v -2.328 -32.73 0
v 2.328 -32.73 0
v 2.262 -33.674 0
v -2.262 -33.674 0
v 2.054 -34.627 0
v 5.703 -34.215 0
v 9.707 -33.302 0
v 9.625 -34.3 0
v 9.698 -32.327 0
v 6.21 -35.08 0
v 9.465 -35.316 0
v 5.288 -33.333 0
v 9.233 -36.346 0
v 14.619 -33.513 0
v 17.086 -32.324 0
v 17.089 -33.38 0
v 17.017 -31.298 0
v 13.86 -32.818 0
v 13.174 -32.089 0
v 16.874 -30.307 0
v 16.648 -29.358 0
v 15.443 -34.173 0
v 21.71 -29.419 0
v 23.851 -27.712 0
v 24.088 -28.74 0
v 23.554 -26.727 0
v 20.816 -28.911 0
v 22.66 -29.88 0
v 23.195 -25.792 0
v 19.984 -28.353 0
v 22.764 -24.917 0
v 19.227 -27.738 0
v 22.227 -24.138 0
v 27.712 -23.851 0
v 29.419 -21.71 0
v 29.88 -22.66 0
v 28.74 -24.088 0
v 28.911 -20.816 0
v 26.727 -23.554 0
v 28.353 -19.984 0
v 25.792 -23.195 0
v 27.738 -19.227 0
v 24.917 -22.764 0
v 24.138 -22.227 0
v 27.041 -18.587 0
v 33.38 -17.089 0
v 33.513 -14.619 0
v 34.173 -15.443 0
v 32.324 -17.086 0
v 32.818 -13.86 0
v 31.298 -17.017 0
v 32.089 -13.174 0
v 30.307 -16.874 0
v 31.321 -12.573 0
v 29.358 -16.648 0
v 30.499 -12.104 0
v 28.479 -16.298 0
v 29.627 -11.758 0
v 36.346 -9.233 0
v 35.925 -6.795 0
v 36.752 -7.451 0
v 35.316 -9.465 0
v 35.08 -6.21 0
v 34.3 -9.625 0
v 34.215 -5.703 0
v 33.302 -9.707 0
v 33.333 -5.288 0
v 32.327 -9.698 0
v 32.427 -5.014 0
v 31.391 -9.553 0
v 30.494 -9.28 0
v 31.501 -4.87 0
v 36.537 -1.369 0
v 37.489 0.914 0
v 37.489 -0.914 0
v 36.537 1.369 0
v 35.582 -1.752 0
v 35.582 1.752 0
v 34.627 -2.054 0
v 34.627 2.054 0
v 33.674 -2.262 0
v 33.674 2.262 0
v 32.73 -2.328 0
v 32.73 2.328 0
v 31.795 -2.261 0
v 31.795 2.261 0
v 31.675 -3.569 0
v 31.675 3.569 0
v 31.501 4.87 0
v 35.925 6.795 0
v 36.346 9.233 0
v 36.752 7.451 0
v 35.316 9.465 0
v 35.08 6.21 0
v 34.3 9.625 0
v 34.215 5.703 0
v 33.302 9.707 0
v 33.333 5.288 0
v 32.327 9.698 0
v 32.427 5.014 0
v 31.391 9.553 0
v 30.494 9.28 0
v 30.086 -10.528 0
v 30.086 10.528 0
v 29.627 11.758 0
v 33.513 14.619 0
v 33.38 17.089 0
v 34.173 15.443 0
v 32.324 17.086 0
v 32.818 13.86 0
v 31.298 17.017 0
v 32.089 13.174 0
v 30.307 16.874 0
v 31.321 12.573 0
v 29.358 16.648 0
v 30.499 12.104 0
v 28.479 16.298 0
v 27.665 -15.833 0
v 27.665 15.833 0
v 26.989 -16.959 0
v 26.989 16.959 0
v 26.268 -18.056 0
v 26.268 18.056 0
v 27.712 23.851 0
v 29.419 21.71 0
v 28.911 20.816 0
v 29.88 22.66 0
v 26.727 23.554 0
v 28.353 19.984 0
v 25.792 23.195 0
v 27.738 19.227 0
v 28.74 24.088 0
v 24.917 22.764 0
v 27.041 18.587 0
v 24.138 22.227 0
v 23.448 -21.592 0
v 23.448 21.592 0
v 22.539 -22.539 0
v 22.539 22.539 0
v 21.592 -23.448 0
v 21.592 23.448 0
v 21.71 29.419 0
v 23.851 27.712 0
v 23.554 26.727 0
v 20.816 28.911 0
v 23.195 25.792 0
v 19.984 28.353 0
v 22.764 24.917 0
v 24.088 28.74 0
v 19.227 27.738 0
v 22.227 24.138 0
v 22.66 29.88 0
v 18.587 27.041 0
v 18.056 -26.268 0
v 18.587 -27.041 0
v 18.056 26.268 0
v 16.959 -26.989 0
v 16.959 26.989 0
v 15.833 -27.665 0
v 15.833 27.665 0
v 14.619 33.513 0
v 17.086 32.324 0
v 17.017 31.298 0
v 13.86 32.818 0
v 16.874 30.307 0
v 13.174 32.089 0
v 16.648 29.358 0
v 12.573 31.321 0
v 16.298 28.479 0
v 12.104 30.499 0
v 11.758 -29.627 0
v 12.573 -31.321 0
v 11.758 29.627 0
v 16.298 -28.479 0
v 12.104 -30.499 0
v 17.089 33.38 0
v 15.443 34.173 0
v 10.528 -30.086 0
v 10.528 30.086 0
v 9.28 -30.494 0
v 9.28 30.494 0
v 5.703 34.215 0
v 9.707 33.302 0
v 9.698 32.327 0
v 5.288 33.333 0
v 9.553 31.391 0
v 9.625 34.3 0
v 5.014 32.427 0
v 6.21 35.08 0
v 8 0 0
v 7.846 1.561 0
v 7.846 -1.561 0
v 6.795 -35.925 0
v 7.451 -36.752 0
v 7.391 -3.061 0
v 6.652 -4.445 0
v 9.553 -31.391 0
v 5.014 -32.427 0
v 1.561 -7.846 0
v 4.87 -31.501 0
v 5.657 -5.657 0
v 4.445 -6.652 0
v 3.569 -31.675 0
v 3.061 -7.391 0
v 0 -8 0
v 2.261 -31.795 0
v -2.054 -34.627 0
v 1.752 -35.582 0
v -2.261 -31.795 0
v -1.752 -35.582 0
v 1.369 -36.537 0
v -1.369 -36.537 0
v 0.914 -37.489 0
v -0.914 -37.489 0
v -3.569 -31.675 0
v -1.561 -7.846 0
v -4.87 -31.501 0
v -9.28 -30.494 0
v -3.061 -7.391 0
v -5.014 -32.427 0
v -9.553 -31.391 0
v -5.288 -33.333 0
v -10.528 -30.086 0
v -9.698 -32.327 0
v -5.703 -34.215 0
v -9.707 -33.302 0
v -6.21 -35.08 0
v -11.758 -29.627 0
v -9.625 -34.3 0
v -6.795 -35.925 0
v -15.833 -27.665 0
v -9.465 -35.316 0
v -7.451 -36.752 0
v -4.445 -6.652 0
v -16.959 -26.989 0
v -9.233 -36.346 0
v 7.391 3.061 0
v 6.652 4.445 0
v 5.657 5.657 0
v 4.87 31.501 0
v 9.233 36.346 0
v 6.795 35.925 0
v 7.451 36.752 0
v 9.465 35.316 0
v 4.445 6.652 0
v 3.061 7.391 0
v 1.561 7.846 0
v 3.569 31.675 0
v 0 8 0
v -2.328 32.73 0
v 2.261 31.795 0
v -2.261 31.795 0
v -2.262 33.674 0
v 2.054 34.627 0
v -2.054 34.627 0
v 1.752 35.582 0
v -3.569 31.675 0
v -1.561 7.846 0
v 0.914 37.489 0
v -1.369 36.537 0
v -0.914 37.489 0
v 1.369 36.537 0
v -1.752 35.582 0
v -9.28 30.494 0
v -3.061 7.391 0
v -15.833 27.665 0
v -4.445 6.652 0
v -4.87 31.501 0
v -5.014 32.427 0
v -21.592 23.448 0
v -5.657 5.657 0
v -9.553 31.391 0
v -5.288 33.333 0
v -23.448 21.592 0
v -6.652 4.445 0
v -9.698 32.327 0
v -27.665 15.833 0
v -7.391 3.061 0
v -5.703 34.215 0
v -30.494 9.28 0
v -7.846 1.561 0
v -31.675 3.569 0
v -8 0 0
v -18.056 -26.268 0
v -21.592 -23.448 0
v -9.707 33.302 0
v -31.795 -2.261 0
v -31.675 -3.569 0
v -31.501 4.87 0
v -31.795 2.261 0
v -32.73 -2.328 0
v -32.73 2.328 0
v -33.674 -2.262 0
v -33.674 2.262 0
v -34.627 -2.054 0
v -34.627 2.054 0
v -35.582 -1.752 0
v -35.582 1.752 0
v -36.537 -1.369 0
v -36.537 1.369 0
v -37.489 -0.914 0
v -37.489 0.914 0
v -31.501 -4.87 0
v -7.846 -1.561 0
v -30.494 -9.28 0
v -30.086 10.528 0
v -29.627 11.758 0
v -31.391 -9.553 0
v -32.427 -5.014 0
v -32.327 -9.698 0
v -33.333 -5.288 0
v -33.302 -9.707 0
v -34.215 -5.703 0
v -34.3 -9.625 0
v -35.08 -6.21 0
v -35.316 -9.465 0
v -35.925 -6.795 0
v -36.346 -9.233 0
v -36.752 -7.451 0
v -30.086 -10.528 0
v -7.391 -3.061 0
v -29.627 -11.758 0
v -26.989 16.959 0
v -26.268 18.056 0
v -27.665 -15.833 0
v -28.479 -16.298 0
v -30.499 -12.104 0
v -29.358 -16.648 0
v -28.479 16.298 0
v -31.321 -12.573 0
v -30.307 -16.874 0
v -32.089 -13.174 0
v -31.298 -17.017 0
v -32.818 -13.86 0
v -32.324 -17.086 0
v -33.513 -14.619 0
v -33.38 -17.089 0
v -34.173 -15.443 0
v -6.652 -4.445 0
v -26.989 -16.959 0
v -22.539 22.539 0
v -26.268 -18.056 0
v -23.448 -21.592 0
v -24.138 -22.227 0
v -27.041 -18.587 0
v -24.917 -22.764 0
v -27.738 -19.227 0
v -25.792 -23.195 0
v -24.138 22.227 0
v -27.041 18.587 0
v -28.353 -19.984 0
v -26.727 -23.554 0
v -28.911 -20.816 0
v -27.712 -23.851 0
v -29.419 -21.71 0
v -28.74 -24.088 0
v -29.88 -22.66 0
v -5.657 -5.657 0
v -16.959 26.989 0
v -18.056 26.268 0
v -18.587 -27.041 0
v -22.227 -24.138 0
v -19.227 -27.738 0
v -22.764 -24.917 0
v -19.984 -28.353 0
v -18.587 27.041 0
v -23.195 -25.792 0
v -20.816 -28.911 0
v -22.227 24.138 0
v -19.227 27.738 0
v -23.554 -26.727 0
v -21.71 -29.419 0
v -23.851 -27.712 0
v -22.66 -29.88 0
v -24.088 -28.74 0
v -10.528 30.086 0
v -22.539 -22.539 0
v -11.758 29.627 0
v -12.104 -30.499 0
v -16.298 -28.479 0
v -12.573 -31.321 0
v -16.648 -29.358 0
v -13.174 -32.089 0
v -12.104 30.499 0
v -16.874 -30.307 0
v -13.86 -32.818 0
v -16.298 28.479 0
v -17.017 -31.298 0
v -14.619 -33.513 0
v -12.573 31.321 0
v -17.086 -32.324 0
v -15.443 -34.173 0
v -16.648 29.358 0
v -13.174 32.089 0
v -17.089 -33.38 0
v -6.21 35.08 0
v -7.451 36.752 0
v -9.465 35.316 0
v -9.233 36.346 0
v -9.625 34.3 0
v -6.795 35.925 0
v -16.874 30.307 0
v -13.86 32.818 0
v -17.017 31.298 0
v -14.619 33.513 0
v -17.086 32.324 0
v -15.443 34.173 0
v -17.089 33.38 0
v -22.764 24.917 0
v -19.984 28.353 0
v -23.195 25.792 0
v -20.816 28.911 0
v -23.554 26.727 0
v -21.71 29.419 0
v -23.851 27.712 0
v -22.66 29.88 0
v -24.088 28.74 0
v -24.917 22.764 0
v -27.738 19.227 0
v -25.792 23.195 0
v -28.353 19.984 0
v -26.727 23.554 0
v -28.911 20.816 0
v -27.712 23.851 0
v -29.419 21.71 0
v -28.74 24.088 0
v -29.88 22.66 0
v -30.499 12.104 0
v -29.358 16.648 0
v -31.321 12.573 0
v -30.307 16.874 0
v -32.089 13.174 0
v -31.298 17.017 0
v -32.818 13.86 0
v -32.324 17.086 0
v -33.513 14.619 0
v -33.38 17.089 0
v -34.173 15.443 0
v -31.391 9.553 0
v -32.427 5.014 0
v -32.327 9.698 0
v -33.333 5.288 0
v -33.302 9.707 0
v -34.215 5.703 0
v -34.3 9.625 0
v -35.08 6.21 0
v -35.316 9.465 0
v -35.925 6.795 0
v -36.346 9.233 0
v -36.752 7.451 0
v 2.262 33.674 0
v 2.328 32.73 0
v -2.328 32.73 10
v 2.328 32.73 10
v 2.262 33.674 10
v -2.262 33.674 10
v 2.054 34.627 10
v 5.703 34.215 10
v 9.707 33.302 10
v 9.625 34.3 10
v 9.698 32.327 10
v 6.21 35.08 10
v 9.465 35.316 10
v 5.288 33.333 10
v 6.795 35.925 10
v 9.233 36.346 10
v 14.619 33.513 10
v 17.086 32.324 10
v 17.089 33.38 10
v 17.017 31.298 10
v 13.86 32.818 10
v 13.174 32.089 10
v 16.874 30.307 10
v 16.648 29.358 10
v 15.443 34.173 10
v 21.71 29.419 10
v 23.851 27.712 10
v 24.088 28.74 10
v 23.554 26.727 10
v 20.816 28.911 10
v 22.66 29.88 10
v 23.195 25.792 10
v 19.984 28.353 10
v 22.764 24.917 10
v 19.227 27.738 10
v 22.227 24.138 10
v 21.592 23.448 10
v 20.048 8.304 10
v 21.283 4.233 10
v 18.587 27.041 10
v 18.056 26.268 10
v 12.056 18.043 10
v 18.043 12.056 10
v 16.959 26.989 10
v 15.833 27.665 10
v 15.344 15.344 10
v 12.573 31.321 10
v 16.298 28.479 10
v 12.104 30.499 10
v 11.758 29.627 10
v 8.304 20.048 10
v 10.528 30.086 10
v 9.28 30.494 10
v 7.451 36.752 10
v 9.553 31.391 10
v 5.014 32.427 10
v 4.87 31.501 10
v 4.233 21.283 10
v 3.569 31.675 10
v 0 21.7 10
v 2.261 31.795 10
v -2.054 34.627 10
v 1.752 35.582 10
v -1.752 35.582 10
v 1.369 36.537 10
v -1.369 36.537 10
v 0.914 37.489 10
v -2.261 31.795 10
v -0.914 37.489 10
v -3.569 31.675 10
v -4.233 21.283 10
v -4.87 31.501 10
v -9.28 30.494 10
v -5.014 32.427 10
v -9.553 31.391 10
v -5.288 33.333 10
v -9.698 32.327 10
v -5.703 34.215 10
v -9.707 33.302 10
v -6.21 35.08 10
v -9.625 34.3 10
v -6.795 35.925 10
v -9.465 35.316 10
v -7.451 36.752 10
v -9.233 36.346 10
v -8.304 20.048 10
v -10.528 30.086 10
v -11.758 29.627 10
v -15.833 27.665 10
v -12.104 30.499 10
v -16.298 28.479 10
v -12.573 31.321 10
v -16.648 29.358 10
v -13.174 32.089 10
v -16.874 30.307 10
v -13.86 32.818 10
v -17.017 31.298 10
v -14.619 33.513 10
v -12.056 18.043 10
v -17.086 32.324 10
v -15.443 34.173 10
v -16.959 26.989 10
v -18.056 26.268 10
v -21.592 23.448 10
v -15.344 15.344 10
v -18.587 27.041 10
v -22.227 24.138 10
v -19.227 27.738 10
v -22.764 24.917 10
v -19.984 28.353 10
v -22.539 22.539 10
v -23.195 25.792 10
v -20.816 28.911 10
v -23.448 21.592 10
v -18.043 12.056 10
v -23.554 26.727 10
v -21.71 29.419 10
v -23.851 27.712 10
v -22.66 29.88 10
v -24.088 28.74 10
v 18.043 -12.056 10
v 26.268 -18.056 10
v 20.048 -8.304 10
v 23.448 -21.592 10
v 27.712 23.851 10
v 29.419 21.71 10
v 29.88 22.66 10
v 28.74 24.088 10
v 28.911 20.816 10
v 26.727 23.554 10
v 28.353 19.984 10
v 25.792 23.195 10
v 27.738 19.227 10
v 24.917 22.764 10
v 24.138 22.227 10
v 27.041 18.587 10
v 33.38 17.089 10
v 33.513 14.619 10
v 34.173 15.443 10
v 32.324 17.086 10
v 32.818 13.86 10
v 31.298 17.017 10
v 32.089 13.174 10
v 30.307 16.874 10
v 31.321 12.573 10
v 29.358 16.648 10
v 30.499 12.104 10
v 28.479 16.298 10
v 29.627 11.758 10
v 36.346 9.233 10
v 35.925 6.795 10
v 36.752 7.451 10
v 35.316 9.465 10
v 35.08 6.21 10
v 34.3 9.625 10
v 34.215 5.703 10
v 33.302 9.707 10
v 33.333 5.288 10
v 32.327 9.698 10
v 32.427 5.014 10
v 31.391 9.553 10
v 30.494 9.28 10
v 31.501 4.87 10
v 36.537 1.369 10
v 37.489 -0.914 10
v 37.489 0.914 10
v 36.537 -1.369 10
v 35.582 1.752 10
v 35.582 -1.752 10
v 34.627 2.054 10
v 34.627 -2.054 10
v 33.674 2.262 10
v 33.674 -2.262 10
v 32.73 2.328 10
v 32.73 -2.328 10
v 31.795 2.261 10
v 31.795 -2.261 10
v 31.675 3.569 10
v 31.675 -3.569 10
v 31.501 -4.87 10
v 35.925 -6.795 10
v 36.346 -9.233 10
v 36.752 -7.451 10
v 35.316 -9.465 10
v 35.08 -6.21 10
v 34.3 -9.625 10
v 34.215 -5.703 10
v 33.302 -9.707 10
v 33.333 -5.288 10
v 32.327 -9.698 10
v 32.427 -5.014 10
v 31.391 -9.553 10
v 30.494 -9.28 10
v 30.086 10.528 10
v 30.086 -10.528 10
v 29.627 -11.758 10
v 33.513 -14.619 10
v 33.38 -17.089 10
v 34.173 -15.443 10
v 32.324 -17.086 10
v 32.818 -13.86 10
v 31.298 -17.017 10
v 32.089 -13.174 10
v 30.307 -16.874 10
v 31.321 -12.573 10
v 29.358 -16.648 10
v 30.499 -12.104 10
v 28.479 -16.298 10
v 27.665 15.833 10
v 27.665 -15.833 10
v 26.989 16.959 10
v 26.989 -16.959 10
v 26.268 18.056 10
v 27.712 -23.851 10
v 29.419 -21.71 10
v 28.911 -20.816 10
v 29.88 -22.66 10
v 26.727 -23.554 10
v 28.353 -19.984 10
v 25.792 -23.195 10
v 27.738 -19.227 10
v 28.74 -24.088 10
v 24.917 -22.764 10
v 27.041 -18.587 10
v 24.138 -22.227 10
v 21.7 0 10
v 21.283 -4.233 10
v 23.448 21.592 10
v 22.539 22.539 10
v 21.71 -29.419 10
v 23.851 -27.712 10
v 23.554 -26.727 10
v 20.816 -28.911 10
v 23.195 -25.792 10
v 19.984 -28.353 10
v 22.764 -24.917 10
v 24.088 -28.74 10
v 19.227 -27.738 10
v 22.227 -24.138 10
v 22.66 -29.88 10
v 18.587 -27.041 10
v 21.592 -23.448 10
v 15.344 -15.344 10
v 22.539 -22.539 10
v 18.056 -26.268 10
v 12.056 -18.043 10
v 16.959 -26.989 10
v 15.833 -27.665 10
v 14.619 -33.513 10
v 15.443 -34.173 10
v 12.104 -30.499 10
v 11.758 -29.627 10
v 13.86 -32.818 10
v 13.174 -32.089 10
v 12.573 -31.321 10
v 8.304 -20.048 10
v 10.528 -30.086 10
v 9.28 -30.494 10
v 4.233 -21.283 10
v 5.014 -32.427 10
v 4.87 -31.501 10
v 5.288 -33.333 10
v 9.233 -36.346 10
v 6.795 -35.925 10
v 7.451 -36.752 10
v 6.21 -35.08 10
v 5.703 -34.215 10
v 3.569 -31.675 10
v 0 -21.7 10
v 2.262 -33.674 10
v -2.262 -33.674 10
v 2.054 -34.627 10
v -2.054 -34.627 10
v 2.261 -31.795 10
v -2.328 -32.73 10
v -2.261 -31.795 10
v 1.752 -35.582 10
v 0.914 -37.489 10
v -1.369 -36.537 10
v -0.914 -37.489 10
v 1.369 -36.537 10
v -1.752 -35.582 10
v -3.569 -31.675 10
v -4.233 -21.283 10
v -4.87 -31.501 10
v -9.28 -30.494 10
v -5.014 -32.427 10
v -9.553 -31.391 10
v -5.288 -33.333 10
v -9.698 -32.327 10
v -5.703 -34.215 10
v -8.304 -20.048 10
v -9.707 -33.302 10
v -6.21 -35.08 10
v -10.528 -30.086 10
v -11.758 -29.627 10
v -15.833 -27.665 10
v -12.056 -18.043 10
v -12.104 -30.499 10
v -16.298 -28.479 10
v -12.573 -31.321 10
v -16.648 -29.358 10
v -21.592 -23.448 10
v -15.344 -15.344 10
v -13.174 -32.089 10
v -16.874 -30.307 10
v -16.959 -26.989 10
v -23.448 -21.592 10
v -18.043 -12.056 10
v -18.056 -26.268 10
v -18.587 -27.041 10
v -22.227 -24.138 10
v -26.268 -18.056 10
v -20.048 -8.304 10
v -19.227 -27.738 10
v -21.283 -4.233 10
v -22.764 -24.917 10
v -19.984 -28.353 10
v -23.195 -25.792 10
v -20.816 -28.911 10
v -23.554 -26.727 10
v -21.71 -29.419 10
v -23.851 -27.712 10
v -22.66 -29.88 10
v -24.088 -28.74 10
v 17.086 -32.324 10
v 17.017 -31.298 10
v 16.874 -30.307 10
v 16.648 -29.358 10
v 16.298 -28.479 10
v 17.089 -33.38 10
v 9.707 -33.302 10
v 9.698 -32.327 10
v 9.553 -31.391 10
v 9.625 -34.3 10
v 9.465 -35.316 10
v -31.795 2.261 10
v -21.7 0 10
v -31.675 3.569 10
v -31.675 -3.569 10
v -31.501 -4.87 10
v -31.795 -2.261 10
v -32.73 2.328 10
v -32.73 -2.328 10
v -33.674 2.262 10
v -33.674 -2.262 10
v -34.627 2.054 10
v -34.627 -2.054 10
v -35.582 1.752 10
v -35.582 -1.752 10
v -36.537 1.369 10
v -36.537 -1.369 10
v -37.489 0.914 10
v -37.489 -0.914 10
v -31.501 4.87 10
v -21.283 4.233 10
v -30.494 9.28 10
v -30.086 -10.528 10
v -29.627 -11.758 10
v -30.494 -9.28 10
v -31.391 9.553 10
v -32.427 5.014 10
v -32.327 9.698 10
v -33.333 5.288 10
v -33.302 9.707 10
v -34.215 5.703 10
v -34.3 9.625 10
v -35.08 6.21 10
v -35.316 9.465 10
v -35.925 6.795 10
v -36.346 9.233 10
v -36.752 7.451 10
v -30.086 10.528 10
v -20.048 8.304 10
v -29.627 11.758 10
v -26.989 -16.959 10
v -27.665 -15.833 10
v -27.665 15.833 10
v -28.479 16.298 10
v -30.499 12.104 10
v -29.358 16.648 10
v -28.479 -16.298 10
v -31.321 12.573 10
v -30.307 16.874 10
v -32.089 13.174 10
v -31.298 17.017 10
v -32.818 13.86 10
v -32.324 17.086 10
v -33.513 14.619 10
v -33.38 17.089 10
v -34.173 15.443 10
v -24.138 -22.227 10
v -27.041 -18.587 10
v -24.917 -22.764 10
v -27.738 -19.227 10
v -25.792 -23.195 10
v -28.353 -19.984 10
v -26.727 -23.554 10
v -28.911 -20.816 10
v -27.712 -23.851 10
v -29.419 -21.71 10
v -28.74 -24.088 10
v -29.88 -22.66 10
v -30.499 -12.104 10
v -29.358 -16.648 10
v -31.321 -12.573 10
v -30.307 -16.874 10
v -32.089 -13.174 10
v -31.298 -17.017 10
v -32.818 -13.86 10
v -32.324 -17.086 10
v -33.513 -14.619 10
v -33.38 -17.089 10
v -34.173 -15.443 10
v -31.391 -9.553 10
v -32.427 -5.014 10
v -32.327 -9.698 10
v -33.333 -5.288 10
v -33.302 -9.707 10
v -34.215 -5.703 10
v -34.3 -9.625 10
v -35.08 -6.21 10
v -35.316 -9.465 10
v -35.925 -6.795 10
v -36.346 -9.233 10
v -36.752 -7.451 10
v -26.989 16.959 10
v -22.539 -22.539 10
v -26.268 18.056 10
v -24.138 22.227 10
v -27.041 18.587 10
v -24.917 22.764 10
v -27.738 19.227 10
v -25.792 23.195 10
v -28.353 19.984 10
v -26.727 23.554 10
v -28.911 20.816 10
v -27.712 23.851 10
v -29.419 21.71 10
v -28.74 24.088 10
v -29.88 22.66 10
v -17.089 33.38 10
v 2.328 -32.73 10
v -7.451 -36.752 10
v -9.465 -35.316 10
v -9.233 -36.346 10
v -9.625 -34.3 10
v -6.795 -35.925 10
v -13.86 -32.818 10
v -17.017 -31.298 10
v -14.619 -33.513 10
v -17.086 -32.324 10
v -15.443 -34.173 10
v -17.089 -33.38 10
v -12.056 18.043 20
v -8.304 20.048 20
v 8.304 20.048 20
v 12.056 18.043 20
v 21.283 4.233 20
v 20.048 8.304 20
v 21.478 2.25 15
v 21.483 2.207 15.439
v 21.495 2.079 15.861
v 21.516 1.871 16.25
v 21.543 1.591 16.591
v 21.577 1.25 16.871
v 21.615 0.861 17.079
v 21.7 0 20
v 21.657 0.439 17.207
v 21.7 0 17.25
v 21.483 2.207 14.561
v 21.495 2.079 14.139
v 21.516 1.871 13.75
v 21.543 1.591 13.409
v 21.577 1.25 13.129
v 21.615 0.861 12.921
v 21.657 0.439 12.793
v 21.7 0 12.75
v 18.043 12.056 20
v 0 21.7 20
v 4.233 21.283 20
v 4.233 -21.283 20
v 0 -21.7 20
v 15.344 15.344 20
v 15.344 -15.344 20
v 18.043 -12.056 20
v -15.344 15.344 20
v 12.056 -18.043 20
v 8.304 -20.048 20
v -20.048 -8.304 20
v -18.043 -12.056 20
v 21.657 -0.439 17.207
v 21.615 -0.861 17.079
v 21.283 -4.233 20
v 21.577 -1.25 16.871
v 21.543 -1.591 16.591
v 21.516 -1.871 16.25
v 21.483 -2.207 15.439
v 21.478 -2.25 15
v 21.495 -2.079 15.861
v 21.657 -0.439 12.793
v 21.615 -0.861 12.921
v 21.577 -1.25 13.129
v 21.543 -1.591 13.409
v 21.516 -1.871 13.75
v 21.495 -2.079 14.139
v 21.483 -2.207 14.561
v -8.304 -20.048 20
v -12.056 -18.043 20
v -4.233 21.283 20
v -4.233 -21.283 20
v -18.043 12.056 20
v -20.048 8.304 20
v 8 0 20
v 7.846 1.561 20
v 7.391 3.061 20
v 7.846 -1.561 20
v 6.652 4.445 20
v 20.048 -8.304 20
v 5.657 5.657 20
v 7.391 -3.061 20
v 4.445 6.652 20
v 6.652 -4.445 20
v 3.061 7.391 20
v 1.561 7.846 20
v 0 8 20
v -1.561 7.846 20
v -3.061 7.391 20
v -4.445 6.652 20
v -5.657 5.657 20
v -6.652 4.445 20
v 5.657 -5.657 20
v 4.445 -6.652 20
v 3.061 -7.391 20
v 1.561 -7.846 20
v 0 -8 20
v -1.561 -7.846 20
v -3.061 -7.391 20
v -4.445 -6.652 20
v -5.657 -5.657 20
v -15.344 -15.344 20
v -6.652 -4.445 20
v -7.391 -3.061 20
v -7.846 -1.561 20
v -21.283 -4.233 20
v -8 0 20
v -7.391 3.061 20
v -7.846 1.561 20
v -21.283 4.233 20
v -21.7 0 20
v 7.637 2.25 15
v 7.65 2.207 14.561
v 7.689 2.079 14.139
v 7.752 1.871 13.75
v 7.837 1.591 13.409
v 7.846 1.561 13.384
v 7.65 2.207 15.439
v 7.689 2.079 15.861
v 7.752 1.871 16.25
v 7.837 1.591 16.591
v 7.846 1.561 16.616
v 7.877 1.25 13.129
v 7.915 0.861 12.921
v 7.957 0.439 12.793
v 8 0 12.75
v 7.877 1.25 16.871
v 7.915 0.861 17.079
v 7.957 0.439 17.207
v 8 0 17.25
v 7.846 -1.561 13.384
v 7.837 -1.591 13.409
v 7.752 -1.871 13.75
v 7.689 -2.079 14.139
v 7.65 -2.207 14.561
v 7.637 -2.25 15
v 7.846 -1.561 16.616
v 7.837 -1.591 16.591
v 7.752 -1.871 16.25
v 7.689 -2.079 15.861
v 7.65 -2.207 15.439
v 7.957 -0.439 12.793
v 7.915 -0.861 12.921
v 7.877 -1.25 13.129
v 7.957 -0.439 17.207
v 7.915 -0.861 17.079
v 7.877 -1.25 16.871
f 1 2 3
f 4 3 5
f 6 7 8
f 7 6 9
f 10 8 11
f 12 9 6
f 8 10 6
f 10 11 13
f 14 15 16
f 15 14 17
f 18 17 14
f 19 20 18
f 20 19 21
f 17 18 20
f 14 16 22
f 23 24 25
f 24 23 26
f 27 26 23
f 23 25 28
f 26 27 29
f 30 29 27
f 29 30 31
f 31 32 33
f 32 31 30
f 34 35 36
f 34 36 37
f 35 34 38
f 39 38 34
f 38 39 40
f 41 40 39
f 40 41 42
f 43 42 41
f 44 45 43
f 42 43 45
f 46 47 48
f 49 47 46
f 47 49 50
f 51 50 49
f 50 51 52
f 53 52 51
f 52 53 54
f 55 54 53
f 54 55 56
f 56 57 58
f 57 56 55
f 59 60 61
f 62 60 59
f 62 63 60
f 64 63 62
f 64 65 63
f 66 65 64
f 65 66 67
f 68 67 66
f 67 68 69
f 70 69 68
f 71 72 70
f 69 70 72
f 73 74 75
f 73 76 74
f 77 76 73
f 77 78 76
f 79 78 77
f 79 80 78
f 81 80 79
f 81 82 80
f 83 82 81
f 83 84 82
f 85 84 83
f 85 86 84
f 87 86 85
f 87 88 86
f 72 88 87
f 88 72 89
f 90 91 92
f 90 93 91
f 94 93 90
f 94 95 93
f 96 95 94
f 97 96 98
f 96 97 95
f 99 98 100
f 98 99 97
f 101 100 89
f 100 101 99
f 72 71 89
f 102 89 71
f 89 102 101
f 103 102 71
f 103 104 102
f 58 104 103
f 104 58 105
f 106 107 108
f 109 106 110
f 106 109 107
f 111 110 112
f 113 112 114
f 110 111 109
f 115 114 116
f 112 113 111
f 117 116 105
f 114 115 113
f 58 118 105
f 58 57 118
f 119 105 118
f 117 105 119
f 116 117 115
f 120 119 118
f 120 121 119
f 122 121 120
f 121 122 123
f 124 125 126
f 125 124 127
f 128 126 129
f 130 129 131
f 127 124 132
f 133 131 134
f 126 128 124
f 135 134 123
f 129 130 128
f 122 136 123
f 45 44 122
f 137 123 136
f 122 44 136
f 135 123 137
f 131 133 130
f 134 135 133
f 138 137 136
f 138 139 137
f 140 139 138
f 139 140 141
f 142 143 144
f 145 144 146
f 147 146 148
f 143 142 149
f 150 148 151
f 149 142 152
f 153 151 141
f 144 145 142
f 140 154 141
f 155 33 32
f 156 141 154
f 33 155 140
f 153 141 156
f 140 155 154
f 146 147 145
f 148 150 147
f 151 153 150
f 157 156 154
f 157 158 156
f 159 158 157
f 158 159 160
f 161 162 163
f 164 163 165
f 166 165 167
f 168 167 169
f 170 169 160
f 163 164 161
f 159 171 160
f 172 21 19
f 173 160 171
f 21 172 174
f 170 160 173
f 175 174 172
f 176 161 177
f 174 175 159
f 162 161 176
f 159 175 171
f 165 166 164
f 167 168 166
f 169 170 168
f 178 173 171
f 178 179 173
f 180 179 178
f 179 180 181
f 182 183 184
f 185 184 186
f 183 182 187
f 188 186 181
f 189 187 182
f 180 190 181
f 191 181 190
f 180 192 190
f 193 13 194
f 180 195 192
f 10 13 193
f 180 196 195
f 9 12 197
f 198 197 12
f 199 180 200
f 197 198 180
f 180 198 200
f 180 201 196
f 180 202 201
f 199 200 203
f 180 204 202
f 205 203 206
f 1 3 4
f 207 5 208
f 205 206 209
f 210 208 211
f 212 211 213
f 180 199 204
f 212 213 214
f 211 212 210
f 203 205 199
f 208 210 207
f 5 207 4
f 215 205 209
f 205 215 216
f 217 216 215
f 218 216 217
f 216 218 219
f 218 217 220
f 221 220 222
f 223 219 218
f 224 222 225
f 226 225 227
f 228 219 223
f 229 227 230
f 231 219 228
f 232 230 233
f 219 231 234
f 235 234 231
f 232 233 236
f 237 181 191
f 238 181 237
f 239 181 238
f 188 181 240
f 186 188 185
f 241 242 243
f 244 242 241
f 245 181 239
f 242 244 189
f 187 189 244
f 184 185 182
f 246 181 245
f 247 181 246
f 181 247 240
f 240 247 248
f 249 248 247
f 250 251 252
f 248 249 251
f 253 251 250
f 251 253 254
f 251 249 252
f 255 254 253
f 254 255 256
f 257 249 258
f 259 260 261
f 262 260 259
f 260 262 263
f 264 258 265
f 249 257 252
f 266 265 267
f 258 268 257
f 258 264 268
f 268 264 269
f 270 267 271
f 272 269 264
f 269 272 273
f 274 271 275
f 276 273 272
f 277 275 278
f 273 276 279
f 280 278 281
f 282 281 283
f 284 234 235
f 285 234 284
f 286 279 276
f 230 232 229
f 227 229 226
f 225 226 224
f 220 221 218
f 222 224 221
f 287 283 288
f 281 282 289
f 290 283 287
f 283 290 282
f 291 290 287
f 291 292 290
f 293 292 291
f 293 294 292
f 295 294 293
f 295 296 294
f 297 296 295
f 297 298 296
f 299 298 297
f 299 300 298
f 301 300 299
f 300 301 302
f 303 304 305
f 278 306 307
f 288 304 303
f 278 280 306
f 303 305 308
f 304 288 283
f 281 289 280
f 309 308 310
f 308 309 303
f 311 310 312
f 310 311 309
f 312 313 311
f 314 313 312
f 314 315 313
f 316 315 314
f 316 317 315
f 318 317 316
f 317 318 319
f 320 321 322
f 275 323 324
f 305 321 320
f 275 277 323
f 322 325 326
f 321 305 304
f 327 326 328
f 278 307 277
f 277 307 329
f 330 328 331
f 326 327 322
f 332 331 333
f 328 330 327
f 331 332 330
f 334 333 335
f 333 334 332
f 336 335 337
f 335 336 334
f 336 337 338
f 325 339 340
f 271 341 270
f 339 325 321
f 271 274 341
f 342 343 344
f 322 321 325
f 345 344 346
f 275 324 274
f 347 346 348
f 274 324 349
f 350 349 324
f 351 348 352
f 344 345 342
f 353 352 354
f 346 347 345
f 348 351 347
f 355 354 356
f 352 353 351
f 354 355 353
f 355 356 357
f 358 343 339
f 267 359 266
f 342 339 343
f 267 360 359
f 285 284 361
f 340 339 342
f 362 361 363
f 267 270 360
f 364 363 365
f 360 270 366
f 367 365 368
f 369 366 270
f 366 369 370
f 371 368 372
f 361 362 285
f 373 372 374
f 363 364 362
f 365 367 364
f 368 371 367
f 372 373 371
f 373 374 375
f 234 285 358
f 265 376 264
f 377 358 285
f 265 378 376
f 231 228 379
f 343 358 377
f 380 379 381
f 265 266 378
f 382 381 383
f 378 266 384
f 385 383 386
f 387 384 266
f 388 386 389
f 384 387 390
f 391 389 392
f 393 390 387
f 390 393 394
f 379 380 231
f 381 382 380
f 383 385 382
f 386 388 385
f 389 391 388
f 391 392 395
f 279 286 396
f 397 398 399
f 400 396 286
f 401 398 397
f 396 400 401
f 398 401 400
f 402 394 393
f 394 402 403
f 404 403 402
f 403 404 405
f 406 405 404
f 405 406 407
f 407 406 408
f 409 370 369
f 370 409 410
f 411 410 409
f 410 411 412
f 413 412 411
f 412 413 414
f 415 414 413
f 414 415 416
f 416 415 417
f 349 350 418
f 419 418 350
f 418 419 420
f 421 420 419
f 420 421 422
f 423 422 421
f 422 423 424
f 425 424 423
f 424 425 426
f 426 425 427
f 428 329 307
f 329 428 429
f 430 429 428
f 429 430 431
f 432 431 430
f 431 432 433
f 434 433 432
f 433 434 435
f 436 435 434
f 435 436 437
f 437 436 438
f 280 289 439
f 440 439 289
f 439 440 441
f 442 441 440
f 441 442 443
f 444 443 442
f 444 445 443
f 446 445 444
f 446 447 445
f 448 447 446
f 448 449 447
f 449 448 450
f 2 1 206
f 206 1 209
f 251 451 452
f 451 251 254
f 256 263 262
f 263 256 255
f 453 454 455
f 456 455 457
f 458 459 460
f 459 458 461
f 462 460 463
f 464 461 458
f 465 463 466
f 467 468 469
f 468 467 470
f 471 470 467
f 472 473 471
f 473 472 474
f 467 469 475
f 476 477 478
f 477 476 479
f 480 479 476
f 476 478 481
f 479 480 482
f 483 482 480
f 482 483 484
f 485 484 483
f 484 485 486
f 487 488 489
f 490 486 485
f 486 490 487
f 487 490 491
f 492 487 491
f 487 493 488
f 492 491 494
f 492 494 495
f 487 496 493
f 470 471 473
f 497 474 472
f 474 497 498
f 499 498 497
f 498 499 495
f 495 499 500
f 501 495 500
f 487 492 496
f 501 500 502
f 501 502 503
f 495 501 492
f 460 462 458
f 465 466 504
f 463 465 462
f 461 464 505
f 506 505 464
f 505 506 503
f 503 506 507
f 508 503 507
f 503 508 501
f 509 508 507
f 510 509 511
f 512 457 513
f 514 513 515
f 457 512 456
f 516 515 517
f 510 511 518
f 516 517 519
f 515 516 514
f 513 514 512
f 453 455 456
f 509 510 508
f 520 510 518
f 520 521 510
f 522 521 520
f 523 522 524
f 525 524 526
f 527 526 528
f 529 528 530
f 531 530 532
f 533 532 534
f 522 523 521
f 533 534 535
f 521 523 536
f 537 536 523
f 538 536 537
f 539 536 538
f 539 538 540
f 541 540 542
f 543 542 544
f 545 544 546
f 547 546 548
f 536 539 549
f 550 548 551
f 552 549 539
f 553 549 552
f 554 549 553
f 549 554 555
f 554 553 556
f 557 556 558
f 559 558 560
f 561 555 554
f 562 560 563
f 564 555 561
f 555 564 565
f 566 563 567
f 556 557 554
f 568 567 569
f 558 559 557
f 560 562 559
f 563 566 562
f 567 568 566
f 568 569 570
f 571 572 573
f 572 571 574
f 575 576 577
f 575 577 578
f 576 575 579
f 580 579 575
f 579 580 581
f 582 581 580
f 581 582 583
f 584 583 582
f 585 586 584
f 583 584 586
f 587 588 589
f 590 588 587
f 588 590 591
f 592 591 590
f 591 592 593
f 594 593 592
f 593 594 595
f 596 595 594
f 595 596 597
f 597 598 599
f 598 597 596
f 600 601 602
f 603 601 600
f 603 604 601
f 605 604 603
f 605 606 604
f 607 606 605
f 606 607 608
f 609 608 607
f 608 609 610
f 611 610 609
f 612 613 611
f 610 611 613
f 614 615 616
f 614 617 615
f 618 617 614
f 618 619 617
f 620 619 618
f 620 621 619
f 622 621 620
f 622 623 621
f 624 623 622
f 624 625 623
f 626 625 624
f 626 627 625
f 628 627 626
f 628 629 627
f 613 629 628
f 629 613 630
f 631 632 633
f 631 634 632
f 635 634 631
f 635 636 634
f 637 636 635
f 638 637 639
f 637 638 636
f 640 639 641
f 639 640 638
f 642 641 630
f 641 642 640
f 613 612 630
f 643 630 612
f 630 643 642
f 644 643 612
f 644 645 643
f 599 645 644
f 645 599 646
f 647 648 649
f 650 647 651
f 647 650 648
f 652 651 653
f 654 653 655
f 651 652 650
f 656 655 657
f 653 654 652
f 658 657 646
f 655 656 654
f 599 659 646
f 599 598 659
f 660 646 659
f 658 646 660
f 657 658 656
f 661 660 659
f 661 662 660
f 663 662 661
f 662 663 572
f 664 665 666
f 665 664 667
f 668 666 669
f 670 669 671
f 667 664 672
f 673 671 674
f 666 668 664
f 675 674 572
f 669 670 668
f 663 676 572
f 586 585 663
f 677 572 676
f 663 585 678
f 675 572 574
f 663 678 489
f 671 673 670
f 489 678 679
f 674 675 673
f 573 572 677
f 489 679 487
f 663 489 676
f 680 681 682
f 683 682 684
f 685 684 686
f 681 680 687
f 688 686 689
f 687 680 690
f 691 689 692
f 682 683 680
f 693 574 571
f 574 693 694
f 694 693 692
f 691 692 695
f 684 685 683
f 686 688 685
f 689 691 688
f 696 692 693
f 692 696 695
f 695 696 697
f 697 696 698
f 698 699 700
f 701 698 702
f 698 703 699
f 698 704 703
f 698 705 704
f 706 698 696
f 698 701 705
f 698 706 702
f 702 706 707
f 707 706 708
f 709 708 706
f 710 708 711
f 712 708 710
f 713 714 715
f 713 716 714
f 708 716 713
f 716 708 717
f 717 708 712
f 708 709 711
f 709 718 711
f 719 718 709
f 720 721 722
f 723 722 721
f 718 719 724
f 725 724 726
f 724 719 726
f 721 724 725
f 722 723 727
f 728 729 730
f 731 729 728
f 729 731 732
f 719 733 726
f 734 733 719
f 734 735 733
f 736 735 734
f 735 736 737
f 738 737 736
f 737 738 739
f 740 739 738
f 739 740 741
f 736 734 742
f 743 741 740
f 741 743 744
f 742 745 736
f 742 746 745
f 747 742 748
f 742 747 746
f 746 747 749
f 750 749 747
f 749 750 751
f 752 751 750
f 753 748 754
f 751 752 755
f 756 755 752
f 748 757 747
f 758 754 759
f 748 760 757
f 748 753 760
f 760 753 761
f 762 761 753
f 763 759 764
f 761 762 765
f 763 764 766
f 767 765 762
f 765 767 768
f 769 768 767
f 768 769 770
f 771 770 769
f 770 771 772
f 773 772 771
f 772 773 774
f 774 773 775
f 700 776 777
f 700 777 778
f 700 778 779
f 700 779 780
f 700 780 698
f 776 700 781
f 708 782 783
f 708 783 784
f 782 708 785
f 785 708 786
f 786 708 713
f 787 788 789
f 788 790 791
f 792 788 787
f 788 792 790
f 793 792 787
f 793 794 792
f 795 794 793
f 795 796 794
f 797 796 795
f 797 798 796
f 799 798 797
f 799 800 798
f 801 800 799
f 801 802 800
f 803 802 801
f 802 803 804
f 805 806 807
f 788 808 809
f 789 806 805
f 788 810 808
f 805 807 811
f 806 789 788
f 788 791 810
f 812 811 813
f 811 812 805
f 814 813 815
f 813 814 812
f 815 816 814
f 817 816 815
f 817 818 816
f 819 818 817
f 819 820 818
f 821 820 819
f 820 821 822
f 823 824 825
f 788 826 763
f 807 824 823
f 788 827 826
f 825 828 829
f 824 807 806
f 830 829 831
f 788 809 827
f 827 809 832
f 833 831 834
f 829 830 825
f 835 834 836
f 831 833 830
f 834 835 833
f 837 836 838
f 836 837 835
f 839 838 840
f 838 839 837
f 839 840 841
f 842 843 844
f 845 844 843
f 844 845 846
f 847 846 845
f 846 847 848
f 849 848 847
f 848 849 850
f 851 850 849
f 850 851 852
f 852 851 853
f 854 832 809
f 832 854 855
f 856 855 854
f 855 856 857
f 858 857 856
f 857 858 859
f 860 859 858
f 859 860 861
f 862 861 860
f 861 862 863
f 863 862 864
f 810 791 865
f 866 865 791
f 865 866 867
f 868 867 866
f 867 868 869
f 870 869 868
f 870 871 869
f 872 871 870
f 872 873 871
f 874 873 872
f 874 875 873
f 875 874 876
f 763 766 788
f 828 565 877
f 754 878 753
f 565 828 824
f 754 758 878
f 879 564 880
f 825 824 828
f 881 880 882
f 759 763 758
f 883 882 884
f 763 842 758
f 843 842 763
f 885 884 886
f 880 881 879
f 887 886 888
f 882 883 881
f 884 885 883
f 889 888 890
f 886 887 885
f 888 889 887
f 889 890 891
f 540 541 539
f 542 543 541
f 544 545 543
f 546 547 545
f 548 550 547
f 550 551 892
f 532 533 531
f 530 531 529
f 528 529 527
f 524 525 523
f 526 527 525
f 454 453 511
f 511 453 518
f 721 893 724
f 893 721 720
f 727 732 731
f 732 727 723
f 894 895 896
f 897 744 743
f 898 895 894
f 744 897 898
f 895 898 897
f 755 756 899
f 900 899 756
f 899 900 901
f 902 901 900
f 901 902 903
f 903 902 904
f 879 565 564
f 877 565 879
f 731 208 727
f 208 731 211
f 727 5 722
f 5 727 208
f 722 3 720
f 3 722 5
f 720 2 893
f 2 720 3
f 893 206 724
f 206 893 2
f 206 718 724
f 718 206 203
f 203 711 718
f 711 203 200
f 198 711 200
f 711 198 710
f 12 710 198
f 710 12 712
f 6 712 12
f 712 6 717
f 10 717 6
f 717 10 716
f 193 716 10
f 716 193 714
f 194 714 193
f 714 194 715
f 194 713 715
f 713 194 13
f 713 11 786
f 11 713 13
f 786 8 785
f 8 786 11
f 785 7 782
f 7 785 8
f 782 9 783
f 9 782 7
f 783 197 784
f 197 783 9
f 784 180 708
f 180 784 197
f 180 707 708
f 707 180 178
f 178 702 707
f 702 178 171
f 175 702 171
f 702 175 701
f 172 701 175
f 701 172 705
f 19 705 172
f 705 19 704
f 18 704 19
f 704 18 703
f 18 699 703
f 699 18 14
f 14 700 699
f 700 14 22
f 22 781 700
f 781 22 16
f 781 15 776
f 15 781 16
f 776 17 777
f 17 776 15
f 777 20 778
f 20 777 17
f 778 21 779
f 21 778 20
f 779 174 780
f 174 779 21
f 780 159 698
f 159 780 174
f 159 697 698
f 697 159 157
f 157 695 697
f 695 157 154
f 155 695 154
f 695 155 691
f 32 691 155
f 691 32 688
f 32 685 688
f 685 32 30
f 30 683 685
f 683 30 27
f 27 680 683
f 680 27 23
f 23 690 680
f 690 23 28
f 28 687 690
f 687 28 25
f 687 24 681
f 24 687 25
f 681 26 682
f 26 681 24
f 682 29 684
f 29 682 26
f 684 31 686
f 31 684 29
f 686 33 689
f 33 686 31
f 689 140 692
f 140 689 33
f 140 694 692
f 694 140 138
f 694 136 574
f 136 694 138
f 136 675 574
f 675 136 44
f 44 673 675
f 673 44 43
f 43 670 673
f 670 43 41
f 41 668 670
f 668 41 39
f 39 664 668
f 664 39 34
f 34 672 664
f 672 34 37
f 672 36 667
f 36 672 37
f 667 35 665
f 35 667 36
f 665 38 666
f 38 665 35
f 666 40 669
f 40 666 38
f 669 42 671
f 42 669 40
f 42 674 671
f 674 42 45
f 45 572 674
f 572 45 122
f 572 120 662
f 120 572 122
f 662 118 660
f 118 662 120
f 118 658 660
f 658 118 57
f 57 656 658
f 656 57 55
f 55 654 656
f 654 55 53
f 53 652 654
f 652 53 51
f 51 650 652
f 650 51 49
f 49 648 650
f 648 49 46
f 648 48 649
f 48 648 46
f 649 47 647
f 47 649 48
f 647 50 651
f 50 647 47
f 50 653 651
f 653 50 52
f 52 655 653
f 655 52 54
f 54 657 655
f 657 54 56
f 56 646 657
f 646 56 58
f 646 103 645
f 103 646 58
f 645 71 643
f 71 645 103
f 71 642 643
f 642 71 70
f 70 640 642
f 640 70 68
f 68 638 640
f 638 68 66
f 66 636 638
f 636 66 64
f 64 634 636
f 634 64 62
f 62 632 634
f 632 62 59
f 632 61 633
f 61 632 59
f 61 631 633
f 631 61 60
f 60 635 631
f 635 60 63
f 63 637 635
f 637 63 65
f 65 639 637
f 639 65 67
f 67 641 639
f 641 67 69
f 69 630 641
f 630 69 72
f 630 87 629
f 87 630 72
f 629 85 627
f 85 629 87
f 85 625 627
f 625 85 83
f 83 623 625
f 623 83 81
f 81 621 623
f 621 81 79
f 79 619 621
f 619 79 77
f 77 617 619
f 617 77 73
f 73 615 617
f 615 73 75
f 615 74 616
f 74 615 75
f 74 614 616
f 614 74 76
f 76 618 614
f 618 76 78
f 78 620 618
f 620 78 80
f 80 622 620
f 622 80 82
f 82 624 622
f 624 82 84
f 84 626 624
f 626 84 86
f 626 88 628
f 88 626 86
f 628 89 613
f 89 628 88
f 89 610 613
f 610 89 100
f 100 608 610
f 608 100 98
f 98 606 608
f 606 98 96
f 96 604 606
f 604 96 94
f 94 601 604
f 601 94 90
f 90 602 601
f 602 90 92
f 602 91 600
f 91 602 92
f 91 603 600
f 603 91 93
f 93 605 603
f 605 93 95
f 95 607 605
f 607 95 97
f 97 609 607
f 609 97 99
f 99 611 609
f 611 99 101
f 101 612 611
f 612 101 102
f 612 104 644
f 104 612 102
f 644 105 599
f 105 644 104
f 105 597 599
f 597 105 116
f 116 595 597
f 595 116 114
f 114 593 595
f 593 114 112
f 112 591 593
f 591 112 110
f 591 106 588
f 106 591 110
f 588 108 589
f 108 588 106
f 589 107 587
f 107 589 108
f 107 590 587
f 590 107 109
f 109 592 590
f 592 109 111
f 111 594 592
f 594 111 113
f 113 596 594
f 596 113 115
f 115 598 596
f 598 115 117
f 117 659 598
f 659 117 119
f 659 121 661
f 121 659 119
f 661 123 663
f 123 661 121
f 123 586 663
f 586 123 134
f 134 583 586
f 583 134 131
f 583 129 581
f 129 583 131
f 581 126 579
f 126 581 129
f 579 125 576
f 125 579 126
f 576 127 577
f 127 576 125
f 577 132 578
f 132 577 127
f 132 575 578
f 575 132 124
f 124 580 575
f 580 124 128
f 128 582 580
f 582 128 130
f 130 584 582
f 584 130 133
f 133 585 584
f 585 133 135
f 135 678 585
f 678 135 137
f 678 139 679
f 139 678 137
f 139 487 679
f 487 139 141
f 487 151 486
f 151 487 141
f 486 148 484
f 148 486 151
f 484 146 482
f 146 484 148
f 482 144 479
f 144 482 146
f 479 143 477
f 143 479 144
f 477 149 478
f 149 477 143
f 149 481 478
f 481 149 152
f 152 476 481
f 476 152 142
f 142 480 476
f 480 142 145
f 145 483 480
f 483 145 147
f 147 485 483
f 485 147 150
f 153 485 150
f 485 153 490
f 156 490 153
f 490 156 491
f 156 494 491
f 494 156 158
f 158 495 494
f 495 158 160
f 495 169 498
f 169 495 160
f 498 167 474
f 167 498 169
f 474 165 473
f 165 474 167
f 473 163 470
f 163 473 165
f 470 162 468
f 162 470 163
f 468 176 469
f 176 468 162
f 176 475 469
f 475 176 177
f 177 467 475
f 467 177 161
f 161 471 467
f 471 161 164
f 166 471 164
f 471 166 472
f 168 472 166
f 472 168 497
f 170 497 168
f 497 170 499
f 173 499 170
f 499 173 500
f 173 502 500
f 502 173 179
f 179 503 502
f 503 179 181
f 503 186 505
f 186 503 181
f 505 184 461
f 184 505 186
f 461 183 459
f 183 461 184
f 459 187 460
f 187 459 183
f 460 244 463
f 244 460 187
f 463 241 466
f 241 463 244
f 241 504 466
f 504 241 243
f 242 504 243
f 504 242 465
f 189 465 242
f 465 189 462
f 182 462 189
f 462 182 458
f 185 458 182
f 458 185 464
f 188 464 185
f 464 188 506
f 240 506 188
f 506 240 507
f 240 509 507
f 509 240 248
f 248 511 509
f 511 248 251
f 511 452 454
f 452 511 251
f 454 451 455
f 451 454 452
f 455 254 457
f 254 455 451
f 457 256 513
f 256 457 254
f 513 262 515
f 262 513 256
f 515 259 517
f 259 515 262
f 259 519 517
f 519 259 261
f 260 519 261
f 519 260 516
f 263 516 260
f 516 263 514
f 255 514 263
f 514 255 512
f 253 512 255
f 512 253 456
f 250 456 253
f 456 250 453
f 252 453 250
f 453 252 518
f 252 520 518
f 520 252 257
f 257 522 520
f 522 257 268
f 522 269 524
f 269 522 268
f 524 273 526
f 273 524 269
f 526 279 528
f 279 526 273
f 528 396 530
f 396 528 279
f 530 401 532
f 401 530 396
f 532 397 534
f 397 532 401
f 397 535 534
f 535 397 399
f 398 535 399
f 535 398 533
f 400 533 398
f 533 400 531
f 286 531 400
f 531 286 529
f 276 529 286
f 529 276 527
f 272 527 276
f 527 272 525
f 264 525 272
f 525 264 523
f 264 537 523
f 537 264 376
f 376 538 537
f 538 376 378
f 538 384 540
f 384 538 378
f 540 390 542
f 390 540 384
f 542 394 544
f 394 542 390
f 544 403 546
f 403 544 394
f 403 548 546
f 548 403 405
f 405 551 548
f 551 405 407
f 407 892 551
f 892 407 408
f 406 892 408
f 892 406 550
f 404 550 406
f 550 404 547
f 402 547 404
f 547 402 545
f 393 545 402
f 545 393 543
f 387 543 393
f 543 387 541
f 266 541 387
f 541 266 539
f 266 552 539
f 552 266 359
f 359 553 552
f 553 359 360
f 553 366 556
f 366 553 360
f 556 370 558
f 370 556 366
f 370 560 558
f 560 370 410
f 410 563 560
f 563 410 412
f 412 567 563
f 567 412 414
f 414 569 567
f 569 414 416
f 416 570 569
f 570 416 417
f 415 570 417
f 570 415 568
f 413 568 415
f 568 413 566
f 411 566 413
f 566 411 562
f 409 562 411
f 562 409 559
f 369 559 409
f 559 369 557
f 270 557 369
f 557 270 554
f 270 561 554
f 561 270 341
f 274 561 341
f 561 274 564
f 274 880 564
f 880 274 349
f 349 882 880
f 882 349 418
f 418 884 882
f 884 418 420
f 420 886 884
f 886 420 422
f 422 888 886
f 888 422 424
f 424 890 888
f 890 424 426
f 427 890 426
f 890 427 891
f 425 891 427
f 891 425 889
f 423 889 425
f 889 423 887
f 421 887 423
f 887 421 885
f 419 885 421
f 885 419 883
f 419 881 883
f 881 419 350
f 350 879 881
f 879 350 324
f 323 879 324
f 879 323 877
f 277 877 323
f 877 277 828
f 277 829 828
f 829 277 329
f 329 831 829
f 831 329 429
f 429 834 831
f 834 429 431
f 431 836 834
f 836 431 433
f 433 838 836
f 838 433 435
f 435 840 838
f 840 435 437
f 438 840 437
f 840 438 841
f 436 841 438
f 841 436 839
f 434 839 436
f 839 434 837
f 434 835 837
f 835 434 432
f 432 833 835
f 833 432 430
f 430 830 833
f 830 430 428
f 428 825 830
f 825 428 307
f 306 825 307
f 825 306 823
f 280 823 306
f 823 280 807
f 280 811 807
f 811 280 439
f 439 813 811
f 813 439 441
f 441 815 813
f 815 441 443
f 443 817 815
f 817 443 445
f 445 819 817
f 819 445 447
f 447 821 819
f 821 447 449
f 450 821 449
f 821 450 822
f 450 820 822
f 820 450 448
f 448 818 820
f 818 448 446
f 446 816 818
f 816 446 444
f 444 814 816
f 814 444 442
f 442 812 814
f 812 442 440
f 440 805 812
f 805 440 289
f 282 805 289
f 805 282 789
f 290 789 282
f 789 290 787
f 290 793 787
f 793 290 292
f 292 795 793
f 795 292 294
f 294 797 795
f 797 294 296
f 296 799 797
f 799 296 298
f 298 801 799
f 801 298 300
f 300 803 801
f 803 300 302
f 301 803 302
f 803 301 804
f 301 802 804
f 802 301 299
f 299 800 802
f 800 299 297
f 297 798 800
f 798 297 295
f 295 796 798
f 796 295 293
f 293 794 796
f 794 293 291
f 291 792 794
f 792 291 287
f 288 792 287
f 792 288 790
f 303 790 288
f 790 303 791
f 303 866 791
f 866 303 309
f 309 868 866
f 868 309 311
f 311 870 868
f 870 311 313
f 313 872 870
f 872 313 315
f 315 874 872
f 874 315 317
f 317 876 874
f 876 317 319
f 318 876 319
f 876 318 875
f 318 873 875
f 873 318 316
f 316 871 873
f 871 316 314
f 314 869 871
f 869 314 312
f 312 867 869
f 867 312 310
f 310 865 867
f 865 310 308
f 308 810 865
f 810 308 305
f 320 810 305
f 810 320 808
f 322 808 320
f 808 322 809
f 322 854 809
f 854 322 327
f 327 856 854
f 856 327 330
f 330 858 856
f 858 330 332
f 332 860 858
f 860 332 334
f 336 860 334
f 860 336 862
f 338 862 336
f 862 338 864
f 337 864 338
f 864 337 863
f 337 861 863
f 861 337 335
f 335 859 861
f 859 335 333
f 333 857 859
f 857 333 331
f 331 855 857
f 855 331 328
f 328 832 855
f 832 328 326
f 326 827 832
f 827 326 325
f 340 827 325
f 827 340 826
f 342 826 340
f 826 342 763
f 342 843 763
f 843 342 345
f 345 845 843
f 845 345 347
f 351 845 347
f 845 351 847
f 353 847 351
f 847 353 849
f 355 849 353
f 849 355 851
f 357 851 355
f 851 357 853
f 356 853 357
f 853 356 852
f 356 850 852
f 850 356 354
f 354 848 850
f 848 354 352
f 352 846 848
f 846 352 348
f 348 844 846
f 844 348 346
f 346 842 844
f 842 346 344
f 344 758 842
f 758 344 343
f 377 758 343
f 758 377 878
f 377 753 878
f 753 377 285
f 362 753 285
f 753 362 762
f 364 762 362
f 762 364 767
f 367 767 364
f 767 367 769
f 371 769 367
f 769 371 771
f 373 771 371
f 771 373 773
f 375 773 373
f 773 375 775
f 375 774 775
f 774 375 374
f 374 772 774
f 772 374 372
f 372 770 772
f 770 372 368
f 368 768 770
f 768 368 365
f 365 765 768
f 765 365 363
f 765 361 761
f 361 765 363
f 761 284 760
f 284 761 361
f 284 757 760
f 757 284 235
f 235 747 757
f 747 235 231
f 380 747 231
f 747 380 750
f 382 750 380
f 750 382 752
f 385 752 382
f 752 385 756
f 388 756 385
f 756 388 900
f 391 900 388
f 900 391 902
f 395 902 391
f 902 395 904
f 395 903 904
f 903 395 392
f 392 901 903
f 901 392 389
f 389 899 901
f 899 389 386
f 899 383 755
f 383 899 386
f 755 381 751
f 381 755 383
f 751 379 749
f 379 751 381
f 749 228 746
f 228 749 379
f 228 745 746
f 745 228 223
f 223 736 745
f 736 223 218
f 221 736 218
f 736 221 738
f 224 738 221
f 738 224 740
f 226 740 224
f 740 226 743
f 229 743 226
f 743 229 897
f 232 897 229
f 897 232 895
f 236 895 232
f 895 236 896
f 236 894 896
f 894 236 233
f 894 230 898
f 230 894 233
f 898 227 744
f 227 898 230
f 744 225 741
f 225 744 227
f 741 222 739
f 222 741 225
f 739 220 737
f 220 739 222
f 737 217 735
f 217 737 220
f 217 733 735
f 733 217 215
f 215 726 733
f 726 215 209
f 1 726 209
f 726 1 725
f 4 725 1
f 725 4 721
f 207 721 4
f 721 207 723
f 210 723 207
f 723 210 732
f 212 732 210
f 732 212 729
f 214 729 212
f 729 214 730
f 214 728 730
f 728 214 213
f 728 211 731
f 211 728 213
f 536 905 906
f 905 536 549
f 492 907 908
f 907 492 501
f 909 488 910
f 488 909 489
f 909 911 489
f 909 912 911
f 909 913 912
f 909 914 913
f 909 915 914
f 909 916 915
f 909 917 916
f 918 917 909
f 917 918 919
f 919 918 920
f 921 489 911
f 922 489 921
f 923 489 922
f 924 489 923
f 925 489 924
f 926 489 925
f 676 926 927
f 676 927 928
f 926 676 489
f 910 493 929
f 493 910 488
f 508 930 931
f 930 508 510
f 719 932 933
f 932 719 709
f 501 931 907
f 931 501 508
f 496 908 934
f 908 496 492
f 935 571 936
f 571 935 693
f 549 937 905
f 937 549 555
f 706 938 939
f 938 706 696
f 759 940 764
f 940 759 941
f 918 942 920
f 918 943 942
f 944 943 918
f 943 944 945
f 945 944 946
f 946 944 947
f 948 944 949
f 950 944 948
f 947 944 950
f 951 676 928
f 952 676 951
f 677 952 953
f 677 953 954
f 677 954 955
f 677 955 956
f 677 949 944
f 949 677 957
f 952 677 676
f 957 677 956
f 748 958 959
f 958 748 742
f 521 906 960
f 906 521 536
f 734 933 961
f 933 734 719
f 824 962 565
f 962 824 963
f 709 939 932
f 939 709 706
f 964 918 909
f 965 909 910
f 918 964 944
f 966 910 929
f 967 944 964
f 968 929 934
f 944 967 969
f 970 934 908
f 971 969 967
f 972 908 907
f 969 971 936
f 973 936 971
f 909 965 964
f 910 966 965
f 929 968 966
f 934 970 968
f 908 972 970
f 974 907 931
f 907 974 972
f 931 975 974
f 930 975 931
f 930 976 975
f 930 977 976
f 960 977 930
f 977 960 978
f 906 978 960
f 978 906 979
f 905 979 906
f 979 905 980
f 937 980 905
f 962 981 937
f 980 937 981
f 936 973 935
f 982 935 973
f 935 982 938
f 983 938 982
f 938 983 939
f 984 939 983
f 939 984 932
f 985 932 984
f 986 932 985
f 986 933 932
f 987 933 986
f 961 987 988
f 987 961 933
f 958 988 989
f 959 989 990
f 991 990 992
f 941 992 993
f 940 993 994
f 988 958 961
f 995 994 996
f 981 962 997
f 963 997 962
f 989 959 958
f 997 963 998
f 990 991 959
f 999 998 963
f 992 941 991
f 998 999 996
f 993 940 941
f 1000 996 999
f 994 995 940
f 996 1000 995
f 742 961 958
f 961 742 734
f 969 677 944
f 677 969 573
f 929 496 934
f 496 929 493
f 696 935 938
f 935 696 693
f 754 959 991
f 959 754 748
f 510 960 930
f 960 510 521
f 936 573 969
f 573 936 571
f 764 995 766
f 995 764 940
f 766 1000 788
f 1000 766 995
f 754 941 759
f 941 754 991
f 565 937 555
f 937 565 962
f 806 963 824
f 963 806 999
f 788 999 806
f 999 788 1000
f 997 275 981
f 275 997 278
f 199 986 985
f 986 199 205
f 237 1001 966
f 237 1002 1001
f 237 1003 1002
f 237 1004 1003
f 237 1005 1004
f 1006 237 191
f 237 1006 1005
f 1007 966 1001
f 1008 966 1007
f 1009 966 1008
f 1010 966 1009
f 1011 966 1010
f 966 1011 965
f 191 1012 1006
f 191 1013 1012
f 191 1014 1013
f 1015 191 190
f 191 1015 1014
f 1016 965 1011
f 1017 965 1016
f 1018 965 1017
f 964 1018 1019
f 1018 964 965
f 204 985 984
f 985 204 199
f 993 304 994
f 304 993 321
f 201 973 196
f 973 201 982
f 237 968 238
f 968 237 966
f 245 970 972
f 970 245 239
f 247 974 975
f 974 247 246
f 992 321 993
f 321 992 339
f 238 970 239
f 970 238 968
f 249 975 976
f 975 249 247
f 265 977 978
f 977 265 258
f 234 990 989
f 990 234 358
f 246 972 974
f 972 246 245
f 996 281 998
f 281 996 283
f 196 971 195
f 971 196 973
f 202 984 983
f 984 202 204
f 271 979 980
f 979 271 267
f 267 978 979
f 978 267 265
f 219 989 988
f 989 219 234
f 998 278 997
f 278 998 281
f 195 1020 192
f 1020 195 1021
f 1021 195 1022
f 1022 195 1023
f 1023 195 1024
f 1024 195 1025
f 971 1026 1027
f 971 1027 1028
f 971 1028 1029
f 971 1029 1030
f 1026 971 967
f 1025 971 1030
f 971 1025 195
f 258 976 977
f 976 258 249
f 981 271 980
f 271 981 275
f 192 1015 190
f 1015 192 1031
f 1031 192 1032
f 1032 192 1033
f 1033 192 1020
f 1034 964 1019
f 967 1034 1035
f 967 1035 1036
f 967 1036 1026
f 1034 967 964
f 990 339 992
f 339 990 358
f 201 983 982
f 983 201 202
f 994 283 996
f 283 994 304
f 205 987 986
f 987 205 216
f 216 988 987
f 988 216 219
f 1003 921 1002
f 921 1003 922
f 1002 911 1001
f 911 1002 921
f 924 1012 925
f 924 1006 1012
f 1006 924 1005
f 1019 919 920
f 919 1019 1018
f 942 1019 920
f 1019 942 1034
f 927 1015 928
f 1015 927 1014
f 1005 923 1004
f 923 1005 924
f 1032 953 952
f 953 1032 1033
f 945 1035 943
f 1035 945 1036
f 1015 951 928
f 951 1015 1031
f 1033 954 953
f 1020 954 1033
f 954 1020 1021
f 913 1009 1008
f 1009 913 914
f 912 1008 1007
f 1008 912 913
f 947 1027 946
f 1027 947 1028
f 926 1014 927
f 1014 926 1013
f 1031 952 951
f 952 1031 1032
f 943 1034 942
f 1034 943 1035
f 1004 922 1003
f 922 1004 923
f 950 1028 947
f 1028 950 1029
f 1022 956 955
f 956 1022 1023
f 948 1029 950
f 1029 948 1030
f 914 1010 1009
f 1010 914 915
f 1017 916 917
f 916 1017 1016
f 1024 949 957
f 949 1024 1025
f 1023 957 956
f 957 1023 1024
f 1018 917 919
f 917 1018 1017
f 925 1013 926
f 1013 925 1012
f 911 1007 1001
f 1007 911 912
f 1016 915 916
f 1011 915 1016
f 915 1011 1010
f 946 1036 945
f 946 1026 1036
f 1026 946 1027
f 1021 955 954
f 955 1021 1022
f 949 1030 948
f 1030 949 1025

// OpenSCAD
$fn = 32;

// ----------------------------------------------------------------------
// Spur gear: m=2.5 z=28, 75 mm tip diameter x 20 mm
// ----------------------------------------------------------------------

// --- parameters (mm) ---
gear_module = 2.5;        // module
tooth_count = 28;         // number of teeth
gear_w = 10;              // face width
pa = 20;                  // pressure angle, deg
bore = 16;                // shaft bore
hub_dia = 43.4;           // hub diameter
hub_len = 10;             // hub above the face
set_d = 4.5;              // set screw tap hole
set_z = 15;               // set screw height

/* --- involute profile --- */
pitch_r = gear_module * tooth_count / 2;
base_r = pitch_r * cos(pa);
tip_r = pitch_r + gear_module;
root_r = pitch_r - 1.25 * gear_module;
flank_steps = 6;

function inv_deg(a) = (tan(a) - a * PI / 180) * 180 / PI;
function flank_r(i) = root_r + (tip_r - root_r) * i / flank_steps;
function half_angle(r) = 90 / tooth_count + inv_deg(pa) - inv_deg(acos(min(1, base_r / r)));
function tooth_pt(k, i, side) =
    let (r = flank_r(i), a = k * 360 / tooth_count + side * half_angle(r))
    [r * cos(a), r * sin(a)];

module tooth_profile() {
  polygon(points = [
    for (k = [0 : tooth_count - 1])
      each [
        for (i = [0 : flank_steps]) tooth_pt(k, i, -1),
        for (i = [flank_steps : -1 : 0]) tooth_pt(k, i, 1),
        let (ta = (k + 0.5) * 360 / tooth_count)
          [root_r * cos(ta), root_r * sin(ta)]
      ]
  ]);
}

module gear_disc() {
  linear_extrude(height = gear_w) tooth_profile();
}

module hub_boss() {
  translate([0, 0, gear_w - 1]) cylinder(h = hub_len + 1, d = hub_dia);
}

difference() {
  union() {
    gear_disc();
    hub_boss();
  }
  translate([0, 0, -1]) cylinder(h = gear_w + hub_len + 3, d = bore);
  /* set screw, drilled radially */
  translate([-1, 0, set_z]) rotate([0, 90, 0]) cylinder(h = hub_dia / 2 + 3, d = set_d);
}
